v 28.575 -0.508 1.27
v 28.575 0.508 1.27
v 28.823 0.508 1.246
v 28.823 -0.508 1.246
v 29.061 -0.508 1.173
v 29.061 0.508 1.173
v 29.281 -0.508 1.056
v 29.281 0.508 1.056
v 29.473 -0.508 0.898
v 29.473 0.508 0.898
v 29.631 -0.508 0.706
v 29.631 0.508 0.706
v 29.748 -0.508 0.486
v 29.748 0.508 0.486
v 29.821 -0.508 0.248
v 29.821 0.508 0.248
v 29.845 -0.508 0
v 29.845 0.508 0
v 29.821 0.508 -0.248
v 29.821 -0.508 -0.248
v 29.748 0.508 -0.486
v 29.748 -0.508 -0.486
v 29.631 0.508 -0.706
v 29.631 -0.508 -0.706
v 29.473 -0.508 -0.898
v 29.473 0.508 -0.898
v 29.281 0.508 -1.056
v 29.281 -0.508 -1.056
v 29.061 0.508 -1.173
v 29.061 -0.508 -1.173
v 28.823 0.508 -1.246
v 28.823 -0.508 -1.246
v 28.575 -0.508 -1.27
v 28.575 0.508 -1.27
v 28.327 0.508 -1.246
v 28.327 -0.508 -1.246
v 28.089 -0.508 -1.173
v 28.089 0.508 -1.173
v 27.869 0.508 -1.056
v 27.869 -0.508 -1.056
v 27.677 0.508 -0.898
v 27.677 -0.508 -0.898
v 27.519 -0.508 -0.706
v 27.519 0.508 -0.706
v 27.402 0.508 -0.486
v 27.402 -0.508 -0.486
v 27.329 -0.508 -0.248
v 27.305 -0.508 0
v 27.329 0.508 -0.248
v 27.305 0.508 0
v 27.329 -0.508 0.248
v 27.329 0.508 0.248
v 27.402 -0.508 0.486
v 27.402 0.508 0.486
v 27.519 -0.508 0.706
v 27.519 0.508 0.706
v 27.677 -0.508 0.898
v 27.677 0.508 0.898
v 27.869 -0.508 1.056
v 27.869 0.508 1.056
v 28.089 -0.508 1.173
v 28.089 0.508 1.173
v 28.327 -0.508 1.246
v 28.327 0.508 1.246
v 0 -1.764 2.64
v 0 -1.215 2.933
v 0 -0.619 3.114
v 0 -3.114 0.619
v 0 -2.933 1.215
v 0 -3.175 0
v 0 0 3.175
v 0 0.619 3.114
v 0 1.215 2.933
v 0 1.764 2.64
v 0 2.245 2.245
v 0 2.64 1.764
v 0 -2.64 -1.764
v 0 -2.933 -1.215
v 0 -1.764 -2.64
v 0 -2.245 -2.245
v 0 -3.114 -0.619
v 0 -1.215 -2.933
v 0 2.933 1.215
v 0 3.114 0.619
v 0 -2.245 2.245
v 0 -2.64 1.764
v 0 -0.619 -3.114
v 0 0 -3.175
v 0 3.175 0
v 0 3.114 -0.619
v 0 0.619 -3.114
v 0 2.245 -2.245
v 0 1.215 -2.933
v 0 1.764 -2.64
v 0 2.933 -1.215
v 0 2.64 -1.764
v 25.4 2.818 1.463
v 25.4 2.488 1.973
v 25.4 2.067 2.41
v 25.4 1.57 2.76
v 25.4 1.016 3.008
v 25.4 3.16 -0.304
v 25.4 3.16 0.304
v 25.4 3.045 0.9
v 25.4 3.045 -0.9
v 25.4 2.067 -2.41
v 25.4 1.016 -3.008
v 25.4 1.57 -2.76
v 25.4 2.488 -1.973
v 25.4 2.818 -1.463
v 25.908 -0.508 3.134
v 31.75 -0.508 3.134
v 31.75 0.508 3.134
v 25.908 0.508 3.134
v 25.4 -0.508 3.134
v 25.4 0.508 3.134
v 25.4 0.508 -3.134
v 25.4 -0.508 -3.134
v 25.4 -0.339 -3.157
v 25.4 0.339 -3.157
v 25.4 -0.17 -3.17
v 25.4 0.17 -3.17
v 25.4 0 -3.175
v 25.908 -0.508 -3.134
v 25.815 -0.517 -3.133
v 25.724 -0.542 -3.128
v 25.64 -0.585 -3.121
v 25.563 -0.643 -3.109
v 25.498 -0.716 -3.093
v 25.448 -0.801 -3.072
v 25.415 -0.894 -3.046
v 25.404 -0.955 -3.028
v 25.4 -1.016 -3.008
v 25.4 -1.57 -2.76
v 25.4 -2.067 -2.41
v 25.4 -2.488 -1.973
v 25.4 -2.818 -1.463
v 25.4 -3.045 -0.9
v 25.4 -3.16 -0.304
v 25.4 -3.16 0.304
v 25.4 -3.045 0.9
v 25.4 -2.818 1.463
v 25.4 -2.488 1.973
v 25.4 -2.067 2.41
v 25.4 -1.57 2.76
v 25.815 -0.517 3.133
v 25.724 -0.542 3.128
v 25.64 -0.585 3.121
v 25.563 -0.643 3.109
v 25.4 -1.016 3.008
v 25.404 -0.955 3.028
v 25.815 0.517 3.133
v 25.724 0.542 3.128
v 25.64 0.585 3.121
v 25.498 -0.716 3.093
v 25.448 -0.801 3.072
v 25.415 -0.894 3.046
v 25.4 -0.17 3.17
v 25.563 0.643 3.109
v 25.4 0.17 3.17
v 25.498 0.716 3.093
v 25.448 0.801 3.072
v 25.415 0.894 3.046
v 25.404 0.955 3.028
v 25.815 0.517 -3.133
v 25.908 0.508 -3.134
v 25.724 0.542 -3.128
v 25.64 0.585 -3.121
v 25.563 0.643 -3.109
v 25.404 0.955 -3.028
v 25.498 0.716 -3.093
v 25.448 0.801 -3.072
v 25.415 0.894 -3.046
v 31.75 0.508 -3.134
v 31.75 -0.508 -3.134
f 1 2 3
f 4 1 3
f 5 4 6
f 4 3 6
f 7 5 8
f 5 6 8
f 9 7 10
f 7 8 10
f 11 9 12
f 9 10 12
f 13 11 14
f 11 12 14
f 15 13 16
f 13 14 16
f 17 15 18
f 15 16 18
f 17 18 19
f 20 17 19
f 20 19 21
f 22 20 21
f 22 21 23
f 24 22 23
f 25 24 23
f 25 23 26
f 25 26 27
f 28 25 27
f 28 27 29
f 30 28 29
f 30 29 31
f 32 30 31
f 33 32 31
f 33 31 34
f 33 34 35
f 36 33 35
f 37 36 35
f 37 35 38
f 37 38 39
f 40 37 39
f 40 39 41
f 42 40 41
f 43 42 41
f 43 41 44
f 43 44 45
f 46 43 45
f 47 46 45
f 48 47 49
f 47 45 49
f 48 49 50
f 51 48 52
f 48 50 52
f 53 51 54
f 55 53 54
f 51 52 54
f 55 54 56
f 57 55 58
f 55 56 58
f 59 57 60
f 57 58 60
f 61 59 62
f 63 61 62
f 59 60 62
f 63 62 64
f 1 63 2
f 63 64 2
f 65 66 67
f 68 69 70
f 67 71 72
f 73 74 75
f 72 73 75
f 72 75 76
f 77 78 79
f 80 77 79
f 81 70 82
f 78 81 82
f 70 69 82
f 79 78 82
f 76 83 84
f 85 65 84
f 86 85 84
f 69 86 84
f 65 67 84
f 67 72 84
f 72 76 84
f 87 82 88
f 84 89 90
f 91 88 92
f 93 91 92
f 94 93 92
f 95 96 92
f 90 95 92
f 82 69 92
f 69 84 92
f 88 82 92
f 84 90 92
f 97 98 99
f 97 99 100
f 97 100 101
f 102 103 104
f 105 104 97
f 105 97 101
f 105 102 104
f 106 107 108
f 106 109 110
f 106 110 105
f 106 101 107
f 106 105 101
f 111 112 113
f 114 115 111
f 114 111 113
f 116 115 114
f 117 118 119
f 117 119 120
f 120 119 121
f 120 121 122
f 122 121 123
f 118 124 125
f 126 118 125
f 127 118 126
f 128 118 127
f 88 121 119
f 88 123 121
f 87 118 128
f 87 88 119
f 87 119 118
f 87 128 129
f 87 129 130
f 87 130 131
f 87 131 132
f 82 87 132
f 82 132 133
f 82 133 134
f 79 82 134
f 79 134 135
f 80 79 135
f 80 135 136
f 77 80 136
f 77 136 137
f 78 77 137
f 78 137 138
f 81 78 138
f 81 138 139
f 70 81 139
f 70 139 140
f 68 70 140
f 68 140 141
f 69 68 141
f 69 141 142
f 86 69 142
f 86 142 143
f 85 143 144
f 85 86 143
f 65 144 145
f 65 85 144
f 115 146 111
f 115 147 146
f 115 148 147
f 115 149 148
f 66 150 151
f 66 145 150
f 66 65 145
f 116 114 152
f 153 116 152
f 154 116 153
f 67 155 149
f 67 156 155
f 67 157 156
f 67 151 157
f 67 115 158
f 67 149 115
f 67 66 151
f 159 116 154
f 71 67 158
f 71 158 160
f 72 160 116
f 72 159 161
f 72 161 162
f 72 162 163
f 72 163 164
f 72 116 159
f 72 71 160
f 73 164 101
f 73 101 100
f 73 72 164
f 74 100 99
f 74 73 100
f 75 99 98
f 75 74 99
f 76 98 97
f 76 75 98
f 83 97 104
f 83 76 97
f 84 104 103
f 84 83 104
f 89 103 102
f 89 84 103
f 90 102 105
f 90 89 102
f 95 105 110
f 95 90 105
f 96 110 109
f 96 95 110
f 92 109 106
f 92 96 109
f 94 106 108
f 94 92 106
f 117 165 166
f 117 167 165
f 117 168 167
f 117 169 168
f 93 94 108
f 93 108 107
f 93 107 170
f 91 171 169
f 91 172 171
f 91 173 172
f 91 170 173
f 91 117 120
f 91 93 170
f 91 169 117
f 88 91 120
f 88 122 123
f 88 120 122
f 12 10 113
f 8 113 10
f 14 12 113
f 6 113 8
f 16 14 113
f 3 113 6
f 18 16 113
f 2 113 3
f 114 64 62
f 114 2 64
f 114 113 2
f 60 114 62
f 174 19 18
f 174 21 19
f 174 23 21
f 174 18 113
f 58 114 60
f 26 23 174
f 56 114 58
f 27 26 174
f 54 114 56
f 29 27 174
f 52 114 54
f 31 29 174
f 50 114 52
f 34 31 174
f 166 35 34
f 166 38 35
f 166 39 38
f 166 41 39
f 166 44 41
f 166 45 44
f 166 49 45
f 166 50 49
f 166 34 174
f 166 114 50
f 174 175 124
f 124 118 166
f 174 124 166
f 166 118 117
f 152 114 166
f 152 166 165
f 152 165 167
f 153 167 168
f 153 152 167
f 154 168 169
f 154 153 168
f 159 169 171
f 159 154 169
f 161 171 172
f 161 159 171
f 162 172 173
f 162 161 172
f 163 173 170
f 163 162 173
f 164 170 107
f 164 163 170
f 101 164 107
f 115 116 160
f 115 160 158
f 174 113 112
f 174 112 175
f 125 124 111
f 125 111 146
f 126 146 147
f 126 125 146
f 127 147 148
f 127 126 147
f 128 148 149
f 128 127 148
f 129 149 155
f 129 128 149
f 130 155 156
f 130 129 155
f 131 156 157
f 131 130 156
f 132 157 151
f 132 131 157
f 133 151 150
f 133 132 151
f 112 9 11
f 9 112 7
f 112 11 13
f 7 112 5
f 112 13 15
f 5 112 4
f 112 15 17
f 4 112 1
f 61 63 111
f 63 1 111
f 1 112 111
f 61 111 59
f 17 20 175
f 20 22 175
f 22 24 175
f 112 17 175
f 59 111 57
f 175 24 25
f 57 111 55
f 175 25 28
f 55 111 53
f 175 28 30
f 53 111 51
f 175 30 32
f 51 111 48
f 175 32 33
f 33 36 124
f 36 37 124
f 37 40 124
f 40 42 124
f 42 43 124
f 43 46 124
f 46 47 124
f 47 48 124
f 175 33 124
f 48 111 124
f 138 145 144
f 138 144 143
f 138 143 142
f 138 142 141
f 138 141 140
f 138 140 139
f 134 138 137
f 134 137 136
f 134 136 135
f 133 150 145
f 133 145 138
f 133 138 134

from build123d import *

# Parameters (mm, degrees)
SKETCH1_R           = 3.175
BOSS_EXTRUDE1_DEPTH = 25.4
SKETCH2_W           = 6.268193042
SKETCH2_H           = 1.016
BOSS_EXTRUDE2_DEPTH = 6.35
SKETCH3_R           = 1.27
CUT_EXTRUDE1_DEPTH  = 33.120205697
FILLET1_R           = 0.508


with BuildPart() as part:
    # Sketch1 → Boss-Extrude1 (new body)
    with BuildSketch(Plane(origin=(0, 0, 0), x_dir=(0, 0, -1), z_dir=(1, 0, 0))):
        Circle(SKETCH1_R)
    extrude(amount=BOSS_EXTRUDE1_DEPTH)

    # Sketch2 → Boss-Extrude2 (add)
    with BuildSketch(Plane(origin=(25.4, 0, 0), x_dir=(0, 0, -1), z_dir=(1, 0, 0))):
        Rectangle(SKETCH2_W, SKETCH2_H)
    extrude(amount=BOSS_EXTRUDE2_DEPTH)

    # Sketch3 → Cut-Extrude1 (cut, through all)
    with BuildSketch(Plane(origin=(0, 0.508, 0), x_dir=(1, 0, 0), z_dir=(0, 1, 0))):
        with Locations(Location((28.575, 0, 0), (0, 0, 270))):
            Circle(SKETCH3_R)
    extrude(amount=-CUT_EXTRUDE1_DEPTH, mode=Mode.SUBTRACT)

    # Fillet1
    # the kernel refuses this fillet: 0.508 mm, written as the material it adds along each edge
    with BuildSketch(Plane(origin=(25.4, -0.508, -3.134096521), x_dir=(0, -1, 0), z_dir=(0, 0, 1))) as fillet1_piece_1_section:
        with BuildLine():
            CenterArc((FILLET1_R, FILLET1_R), FILLET1_R, 180, 90)
            Line((0, FILLET1_R), (0, 0))
            Line((0, 0), (FILLET1_R, 0))
        make_face()
    fillet1_piece_1 = extrude(amount=6.268193041, mode=Mode.PRIVATE)
    fillet1_piece_1 = fillet1_piece_1 & Plane(origin=(25.515488837, 0, 0), x_dir=(0, 0, -1), z_dir=(-1, 0, 0)) * Cylinder(3.175, 15, mode=Mode.PRIVATE)
    add(fillet1_piece_1)
    with BuildSketch(Plane(origin=(25.4, 0.508, 3.134096521), x_dir=(0, 1, 0), z_dir=(0, 0, -1))) as fillet1_piece_2_section:
        with BuildLine():
            CenterArc((FILLET1_R, FILLET1_R), FILLET1_R, 180, 90)
            Line((0, FILLET1_R), (0, 0))
            Line((0, 0), (FILLET1_R, 0))
        make_face()
    fillet1_piece_2 = extrude(amount=6.268193041, mode=Mode.PRIVATE)
    fillet1_piece_2 = fillet1_piece_2 & Plane(origin=(25.515488837, 0, 0), x_dir=(0, 0, -1), z_dir=(-1, 0, 0)) * Cylinder(3.175, 15, mode=Mode.PRIVATE)
    add(fillet1_piece_2)


solid = part.part
